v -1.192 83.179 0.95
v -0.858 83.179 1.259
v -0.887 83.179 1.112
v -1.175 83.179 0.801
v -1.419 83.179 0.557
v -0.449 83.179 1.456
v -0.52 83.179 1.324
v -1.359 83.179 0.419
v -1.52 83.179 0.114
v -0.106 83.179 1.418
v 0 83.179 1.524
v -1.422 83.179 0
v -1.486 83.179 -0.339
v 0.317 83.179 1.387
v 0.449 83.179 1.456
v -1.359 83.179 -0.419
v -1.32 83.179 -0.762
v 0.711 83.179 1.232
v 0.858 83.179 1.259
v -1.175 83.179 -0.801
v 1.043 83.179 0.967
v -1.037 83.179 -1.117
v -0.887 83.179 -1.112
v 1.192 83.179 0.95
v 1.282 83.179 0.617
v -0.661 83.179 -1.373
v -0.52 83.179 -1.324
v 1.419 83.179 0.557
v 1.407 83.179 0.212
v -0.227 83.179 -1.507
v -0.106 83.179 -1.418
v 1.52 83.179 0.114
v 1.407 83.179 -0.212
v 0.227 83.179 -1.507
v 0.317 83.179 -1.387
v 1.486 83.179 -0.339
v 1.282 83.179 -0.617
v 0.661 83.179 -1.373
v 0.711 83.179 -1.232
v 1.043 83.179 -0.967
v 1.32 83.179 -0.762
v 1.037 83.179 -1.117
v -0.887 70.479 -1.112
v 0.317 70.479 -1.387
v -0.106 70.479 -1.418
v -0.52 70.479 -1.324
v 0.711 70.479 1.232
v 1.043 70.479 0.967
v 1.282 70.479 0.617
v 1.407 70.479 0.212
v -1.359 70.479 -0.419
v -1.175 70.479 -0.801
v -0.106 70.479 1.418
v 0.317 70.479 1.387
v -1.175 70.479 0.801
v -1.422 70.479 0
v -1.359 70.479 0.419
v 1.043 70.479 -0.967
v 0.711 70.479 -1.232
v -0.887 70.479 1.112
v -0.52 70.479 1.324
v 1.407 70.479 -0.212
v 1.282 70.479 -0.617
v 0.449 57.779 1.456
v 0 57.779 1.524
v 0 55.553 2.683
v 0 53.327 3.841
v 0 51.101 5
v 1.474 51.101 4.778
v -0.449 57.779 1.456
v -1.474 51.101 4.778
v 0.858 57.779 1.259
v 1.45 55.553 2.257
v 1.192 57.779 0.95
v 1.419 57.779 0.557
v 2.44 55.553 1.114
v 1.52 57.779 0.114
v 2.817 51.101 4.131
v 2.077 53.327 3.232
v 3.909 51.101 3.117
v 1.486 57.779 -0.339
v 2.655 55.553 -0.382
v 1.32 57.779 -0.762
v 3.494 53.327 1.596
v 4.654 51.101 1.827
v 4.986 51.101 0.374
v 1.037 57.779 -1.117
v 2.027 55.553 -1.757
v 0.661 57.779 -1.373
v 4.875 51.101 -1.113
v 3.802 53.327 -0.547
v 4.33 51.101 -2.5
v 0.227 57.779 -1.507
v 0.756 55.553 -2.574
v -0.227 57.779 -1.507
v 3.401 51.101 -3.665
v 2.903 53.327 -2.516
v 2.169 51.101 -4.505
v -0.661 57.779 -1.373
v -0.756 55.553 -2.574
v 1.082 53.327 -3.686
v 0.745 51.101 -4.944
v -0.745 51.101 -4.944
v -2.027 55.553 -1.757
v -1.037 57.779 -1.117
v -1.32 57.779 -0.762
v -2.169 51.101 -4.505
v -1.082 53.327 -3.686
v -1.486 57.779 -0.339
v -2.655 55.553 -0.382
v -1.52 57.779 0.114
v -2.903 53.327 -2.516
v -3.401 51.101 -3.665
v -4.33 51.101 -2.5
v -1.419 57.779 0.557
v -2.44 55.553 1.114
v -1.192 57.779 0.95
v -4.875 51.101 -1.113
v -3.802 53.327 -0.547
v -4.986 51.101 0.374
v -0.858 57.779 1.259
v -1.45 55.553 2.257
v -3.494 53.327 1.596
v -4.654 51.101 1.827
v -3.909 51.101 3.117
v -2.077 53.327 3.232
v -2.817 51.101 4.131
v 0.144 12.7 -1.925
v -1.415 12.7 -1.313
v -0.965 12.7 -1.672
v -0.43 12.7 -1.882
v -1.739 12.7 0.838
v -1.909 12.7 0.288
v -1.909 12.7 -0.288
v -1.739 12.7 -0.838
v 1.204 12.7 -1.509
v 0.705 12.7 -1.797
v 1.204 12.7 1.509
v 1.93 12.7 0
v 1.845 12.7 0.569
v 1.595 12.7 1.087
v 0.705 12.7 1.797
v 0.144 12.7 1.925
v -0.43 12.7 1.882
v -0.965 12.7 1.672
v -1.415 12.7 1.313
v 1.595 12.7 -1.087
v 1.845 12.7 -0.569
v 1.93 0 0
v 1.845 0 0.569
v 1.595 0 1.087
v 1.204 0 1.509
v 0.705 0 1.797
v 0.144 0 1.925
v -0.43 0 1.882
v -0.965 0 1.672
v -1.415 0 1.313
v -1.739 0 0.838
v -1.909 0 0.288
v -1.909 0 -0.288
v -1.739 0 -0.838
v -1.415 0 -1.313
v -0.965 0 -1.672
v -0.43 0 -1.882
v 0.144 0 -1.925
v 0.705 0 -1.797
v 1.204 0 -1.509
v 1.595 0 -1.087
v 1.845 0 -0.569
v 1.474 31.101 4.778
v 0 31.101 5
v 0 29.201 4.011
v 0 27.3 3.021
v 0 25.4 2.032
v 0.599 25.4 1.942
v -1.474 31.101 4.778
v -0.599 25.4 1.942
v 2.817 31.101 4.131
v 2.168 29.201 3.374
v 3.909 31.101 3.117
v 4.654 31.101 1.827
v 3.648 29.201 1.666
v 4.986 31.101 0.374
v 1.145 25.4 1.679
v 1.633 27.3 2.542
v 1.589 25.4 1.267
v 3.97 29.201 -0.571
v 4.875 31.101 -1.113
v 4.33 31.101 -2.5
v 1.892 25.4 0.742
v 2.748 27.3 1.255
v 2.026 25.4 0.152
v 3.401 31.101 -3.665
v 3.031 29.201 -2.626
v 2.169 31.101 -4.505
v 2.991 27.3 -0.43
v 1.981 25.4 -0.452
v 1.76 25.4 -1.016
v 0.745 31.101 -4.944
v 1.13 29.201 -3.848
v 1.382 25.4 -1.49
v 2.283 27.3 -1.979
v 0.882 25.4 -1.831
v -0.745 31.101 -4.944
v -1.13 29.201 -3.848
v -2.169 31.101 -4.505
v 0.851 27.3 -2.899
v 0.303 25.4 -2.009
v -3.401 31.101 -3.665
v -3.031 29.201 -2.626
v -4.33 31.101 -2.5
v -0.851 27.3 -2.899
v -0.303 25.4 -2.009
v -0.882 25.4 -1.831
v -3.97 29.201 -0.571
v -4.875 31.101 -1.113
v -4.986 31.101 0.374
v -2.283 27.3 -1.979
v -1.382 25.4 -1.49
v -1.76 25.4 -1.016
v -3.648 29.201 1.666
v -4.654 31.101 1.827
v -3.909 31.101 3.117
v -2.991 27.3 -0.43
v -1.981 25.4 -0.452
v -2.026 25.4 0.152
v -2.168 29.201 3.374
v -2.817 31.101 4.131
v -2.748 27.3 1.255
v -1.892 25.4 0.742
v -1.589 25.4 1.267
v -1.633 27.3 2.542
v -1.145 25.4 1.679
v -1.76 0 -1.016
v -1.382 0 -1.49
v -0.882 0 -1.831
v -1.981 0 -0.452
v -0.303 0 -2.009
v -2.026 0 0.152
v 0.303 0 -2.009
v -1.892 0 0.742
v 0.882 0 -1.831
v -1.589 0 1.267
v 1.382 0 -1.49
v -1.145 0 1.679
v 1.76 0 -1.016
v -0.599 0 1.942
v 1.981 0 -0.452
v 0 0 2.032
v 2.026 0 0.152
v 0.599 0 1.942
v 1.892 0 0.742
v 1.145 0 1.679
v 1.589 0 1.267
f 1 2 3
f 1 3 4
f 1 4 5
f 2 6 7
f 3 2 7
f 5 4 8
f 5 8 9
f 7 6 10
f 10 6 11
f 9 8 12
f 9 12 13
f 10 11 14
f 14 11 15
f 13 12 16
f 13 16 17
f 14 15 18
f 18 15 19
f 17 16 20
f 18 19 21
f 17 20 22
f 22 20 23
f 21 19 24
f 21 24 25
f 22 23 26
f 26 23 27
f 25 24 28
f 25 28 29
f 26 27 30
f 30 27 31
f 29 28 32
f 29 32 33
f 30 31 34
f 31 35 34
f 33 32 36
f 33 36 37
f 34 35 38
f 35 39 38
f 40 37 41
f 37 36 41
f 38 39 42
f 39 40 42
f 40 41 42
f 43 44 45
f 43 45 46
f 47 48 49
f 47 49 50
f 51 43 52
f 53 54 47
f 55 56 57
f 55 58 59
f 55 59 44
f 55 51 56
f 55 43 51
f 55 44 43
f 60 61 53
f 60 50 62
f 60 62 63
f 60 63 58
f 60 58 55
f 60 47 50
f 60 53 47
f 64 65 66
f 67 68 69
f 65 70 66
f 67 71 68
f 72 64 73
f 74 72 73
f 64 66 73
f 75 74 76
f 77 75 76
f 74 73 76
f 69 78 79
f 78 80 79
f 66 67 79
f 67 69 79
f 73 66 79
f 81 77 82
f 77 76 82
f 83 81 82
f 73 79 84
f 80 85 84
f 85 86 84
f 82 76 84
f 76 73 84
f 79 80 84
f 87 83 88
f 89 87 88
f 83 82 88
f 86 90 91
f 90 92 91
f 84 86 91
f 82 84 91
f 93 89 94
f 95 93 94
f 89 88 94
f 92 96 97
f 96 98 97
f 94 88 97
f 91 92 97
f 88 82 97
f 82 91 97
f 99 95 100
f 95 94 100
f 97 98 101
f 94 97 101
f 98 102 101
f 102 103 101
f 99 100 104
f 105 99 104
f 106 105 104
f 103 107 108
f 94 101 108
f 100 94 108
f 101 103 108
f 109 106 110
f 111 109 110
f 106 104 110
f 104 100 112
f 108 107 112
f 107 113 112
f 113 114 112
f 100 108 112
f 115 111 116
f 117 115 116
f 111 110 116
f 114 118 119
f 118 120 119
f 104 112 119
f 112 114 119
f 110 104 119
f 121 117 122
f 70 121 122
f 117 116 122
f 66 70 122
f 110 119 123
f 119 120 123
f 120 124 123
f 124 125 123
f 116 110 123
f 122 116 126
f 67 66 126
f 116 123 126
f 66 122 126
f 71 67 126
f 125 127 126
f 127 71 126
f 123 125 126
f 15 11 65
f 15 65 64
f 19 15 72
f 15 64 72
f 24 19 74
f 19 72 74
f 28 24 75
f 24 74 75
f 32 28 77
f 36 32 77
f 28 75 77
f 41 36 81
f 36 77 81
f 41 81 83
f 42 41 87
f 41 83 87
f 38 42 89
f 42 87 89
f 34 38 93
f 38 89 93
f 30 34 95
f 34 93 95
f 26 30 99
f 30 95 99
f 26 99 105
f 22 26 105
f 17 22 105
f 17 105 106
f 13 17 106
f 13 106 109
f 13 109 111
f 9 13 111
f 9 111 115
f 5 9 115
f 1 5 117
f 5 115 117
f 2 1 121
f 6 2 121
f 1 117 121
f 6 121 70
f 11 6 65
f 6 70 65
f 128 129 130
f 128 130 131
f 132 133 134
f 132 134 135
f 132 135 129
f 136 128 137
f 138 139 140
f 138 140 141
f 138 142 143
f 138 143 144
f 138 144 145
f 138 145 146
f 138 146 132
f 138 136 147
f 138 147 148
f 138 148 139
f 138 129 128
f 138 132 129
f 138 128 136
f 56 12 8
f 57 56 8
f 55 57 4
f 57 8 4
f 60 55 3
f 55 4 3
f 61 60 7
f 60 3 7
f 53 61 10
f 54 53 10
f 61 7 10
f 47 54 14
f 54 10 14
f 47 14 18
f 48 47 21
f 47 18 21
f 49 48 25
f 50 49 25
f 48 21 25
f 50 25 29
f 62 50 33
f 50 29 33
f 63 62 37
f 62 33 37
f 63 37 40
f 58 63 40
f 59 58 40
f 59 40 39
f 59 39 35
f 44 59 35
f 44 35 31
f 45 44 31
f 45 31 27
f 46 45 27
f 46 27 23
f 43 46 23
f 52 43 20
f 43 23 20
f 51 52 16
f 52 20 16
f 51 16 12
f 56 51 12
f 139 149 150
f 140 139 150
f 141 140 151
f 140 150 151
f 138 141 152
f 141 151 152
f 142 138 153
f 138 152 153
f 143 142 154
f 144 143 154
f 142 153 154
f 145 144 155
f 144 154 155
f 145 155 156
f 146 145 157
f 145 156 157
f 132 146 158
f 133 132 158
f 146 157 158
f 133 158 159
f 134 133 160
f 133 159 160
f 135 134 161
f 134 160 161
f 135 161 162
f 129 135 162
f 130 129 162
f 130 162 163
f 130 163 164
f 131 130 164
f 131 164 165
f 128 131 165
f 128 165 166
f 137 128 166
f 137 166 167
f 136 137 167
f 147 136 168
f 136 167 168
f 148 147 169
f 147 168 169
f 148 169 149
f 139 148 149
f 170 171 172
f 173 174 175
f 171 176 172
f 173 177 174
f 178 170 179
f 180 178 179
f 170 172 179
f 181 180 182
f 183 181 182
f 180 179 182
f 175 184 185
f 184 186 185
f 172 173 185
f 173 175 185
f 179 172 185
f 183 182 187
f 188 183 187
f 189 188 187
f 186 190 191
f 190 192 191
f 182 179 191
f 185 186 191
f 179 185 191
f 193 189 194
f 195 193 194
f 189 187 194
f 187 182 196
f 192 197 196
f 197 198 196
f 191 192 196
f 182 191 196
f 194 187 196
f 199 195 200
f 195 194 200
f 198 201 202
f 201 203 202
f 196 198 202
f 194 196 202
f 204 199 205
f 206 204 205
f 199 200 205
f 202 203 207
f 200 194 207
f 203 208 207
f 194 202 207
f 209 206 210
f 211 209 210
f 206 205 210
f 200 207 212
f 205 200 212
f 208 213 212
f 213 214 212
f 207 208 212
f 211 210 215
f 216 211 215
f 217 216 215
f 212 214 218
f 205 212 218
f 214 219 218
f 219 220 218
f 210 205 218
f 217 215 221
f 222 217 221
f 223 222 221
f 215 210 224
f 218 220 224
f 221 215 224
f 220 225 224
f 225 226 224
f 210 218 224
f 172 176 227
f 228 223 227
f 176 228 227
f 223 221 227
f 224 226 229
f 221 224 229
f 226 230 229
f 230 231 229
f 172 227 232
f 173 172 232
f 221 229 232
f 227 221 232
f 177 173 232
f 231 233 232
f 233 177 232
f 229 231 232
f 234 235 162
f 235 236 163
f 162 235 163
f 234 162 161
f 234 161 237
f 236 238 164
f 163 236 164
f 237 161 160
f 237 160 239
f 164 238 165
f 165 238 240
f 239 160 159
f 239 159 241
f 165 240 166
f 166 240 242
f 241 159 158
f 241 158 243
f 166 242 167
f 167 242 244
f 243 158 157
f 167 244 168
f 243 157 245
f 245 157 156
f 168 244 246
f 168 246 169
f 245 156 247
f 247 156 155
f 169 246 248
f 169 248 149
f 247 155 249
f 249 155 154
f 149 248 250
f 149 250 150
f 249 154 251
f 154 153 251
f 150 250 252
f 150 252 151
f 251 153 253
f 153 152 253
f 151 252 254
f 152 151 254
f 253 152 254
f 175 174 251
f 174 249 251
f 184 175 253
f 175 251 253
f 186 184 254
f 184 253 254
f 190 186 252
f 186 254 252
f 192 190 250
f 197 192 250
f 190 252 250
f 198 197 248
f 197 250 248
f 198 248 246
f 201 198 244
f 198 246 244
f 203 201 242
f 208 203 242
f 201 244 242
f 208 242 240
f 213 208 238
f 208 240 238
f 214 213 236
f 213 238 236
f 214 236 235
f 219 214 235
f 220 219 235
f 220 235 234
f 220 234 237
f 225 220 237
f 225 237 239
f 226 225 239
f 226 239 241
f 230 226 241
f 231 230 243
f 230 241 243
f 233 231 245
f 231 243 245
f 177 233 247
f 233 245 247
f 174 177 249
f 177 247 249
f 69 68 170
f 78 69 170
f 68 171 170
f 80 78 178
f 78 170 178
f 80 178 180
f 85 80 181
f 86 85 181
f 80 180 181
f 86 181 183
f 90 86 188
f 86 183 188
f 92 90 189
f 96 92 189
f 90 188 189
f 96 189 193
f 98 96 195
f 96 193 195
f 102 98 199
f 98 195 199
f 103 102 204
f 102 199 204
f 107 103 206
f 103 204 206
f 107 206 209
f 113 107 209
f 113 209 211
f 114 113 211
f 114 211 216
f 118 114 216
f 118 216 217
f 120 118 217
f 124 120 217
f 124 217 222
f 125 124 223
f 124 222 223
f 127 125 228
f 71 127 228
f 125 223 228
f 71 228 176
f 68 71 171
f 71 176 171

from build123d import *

# Parameters (mm, degrees)
F2_R     = 1.9304
F3_DEPTH = 12.7
F4_R     = 1.4224
F5_DEPTH = 12.7


with BuildPart() as f1:
    # F0 (on Right) → F1 (revolve)
    with BuildSketch(Plane.YZ):
        Polygon((0, 2.032), (0, 0), (83.178809, 0), (83.178809, 1.524), (57.778809, 1.524), (51.101475, 5), (31.101475, 5), (25.4, 2.032), align=None)
    revolve(axis=Axis((0, 41.589404, 0), (0, 1, 0)))

    # F2 (on face) → F3 (cut)
    with BuildSketch(Plane.XZ):
        Circle(F2_R)
    extrude(amount=-F3_DEPTH, mode=Mode.SUBTRACT)

    # F4 (on face) → F5 (cut)
    with BuildSketch(Plane(origin=(0, 83.178809, 0), x_dir=(-1, 0, 0), z_dir=(0, 1, 0))):
        Circle(F4_R)
    extrude(amount=-F5_DEPTH, mode=Mode.SUBTRACT)


solid = f1.part
